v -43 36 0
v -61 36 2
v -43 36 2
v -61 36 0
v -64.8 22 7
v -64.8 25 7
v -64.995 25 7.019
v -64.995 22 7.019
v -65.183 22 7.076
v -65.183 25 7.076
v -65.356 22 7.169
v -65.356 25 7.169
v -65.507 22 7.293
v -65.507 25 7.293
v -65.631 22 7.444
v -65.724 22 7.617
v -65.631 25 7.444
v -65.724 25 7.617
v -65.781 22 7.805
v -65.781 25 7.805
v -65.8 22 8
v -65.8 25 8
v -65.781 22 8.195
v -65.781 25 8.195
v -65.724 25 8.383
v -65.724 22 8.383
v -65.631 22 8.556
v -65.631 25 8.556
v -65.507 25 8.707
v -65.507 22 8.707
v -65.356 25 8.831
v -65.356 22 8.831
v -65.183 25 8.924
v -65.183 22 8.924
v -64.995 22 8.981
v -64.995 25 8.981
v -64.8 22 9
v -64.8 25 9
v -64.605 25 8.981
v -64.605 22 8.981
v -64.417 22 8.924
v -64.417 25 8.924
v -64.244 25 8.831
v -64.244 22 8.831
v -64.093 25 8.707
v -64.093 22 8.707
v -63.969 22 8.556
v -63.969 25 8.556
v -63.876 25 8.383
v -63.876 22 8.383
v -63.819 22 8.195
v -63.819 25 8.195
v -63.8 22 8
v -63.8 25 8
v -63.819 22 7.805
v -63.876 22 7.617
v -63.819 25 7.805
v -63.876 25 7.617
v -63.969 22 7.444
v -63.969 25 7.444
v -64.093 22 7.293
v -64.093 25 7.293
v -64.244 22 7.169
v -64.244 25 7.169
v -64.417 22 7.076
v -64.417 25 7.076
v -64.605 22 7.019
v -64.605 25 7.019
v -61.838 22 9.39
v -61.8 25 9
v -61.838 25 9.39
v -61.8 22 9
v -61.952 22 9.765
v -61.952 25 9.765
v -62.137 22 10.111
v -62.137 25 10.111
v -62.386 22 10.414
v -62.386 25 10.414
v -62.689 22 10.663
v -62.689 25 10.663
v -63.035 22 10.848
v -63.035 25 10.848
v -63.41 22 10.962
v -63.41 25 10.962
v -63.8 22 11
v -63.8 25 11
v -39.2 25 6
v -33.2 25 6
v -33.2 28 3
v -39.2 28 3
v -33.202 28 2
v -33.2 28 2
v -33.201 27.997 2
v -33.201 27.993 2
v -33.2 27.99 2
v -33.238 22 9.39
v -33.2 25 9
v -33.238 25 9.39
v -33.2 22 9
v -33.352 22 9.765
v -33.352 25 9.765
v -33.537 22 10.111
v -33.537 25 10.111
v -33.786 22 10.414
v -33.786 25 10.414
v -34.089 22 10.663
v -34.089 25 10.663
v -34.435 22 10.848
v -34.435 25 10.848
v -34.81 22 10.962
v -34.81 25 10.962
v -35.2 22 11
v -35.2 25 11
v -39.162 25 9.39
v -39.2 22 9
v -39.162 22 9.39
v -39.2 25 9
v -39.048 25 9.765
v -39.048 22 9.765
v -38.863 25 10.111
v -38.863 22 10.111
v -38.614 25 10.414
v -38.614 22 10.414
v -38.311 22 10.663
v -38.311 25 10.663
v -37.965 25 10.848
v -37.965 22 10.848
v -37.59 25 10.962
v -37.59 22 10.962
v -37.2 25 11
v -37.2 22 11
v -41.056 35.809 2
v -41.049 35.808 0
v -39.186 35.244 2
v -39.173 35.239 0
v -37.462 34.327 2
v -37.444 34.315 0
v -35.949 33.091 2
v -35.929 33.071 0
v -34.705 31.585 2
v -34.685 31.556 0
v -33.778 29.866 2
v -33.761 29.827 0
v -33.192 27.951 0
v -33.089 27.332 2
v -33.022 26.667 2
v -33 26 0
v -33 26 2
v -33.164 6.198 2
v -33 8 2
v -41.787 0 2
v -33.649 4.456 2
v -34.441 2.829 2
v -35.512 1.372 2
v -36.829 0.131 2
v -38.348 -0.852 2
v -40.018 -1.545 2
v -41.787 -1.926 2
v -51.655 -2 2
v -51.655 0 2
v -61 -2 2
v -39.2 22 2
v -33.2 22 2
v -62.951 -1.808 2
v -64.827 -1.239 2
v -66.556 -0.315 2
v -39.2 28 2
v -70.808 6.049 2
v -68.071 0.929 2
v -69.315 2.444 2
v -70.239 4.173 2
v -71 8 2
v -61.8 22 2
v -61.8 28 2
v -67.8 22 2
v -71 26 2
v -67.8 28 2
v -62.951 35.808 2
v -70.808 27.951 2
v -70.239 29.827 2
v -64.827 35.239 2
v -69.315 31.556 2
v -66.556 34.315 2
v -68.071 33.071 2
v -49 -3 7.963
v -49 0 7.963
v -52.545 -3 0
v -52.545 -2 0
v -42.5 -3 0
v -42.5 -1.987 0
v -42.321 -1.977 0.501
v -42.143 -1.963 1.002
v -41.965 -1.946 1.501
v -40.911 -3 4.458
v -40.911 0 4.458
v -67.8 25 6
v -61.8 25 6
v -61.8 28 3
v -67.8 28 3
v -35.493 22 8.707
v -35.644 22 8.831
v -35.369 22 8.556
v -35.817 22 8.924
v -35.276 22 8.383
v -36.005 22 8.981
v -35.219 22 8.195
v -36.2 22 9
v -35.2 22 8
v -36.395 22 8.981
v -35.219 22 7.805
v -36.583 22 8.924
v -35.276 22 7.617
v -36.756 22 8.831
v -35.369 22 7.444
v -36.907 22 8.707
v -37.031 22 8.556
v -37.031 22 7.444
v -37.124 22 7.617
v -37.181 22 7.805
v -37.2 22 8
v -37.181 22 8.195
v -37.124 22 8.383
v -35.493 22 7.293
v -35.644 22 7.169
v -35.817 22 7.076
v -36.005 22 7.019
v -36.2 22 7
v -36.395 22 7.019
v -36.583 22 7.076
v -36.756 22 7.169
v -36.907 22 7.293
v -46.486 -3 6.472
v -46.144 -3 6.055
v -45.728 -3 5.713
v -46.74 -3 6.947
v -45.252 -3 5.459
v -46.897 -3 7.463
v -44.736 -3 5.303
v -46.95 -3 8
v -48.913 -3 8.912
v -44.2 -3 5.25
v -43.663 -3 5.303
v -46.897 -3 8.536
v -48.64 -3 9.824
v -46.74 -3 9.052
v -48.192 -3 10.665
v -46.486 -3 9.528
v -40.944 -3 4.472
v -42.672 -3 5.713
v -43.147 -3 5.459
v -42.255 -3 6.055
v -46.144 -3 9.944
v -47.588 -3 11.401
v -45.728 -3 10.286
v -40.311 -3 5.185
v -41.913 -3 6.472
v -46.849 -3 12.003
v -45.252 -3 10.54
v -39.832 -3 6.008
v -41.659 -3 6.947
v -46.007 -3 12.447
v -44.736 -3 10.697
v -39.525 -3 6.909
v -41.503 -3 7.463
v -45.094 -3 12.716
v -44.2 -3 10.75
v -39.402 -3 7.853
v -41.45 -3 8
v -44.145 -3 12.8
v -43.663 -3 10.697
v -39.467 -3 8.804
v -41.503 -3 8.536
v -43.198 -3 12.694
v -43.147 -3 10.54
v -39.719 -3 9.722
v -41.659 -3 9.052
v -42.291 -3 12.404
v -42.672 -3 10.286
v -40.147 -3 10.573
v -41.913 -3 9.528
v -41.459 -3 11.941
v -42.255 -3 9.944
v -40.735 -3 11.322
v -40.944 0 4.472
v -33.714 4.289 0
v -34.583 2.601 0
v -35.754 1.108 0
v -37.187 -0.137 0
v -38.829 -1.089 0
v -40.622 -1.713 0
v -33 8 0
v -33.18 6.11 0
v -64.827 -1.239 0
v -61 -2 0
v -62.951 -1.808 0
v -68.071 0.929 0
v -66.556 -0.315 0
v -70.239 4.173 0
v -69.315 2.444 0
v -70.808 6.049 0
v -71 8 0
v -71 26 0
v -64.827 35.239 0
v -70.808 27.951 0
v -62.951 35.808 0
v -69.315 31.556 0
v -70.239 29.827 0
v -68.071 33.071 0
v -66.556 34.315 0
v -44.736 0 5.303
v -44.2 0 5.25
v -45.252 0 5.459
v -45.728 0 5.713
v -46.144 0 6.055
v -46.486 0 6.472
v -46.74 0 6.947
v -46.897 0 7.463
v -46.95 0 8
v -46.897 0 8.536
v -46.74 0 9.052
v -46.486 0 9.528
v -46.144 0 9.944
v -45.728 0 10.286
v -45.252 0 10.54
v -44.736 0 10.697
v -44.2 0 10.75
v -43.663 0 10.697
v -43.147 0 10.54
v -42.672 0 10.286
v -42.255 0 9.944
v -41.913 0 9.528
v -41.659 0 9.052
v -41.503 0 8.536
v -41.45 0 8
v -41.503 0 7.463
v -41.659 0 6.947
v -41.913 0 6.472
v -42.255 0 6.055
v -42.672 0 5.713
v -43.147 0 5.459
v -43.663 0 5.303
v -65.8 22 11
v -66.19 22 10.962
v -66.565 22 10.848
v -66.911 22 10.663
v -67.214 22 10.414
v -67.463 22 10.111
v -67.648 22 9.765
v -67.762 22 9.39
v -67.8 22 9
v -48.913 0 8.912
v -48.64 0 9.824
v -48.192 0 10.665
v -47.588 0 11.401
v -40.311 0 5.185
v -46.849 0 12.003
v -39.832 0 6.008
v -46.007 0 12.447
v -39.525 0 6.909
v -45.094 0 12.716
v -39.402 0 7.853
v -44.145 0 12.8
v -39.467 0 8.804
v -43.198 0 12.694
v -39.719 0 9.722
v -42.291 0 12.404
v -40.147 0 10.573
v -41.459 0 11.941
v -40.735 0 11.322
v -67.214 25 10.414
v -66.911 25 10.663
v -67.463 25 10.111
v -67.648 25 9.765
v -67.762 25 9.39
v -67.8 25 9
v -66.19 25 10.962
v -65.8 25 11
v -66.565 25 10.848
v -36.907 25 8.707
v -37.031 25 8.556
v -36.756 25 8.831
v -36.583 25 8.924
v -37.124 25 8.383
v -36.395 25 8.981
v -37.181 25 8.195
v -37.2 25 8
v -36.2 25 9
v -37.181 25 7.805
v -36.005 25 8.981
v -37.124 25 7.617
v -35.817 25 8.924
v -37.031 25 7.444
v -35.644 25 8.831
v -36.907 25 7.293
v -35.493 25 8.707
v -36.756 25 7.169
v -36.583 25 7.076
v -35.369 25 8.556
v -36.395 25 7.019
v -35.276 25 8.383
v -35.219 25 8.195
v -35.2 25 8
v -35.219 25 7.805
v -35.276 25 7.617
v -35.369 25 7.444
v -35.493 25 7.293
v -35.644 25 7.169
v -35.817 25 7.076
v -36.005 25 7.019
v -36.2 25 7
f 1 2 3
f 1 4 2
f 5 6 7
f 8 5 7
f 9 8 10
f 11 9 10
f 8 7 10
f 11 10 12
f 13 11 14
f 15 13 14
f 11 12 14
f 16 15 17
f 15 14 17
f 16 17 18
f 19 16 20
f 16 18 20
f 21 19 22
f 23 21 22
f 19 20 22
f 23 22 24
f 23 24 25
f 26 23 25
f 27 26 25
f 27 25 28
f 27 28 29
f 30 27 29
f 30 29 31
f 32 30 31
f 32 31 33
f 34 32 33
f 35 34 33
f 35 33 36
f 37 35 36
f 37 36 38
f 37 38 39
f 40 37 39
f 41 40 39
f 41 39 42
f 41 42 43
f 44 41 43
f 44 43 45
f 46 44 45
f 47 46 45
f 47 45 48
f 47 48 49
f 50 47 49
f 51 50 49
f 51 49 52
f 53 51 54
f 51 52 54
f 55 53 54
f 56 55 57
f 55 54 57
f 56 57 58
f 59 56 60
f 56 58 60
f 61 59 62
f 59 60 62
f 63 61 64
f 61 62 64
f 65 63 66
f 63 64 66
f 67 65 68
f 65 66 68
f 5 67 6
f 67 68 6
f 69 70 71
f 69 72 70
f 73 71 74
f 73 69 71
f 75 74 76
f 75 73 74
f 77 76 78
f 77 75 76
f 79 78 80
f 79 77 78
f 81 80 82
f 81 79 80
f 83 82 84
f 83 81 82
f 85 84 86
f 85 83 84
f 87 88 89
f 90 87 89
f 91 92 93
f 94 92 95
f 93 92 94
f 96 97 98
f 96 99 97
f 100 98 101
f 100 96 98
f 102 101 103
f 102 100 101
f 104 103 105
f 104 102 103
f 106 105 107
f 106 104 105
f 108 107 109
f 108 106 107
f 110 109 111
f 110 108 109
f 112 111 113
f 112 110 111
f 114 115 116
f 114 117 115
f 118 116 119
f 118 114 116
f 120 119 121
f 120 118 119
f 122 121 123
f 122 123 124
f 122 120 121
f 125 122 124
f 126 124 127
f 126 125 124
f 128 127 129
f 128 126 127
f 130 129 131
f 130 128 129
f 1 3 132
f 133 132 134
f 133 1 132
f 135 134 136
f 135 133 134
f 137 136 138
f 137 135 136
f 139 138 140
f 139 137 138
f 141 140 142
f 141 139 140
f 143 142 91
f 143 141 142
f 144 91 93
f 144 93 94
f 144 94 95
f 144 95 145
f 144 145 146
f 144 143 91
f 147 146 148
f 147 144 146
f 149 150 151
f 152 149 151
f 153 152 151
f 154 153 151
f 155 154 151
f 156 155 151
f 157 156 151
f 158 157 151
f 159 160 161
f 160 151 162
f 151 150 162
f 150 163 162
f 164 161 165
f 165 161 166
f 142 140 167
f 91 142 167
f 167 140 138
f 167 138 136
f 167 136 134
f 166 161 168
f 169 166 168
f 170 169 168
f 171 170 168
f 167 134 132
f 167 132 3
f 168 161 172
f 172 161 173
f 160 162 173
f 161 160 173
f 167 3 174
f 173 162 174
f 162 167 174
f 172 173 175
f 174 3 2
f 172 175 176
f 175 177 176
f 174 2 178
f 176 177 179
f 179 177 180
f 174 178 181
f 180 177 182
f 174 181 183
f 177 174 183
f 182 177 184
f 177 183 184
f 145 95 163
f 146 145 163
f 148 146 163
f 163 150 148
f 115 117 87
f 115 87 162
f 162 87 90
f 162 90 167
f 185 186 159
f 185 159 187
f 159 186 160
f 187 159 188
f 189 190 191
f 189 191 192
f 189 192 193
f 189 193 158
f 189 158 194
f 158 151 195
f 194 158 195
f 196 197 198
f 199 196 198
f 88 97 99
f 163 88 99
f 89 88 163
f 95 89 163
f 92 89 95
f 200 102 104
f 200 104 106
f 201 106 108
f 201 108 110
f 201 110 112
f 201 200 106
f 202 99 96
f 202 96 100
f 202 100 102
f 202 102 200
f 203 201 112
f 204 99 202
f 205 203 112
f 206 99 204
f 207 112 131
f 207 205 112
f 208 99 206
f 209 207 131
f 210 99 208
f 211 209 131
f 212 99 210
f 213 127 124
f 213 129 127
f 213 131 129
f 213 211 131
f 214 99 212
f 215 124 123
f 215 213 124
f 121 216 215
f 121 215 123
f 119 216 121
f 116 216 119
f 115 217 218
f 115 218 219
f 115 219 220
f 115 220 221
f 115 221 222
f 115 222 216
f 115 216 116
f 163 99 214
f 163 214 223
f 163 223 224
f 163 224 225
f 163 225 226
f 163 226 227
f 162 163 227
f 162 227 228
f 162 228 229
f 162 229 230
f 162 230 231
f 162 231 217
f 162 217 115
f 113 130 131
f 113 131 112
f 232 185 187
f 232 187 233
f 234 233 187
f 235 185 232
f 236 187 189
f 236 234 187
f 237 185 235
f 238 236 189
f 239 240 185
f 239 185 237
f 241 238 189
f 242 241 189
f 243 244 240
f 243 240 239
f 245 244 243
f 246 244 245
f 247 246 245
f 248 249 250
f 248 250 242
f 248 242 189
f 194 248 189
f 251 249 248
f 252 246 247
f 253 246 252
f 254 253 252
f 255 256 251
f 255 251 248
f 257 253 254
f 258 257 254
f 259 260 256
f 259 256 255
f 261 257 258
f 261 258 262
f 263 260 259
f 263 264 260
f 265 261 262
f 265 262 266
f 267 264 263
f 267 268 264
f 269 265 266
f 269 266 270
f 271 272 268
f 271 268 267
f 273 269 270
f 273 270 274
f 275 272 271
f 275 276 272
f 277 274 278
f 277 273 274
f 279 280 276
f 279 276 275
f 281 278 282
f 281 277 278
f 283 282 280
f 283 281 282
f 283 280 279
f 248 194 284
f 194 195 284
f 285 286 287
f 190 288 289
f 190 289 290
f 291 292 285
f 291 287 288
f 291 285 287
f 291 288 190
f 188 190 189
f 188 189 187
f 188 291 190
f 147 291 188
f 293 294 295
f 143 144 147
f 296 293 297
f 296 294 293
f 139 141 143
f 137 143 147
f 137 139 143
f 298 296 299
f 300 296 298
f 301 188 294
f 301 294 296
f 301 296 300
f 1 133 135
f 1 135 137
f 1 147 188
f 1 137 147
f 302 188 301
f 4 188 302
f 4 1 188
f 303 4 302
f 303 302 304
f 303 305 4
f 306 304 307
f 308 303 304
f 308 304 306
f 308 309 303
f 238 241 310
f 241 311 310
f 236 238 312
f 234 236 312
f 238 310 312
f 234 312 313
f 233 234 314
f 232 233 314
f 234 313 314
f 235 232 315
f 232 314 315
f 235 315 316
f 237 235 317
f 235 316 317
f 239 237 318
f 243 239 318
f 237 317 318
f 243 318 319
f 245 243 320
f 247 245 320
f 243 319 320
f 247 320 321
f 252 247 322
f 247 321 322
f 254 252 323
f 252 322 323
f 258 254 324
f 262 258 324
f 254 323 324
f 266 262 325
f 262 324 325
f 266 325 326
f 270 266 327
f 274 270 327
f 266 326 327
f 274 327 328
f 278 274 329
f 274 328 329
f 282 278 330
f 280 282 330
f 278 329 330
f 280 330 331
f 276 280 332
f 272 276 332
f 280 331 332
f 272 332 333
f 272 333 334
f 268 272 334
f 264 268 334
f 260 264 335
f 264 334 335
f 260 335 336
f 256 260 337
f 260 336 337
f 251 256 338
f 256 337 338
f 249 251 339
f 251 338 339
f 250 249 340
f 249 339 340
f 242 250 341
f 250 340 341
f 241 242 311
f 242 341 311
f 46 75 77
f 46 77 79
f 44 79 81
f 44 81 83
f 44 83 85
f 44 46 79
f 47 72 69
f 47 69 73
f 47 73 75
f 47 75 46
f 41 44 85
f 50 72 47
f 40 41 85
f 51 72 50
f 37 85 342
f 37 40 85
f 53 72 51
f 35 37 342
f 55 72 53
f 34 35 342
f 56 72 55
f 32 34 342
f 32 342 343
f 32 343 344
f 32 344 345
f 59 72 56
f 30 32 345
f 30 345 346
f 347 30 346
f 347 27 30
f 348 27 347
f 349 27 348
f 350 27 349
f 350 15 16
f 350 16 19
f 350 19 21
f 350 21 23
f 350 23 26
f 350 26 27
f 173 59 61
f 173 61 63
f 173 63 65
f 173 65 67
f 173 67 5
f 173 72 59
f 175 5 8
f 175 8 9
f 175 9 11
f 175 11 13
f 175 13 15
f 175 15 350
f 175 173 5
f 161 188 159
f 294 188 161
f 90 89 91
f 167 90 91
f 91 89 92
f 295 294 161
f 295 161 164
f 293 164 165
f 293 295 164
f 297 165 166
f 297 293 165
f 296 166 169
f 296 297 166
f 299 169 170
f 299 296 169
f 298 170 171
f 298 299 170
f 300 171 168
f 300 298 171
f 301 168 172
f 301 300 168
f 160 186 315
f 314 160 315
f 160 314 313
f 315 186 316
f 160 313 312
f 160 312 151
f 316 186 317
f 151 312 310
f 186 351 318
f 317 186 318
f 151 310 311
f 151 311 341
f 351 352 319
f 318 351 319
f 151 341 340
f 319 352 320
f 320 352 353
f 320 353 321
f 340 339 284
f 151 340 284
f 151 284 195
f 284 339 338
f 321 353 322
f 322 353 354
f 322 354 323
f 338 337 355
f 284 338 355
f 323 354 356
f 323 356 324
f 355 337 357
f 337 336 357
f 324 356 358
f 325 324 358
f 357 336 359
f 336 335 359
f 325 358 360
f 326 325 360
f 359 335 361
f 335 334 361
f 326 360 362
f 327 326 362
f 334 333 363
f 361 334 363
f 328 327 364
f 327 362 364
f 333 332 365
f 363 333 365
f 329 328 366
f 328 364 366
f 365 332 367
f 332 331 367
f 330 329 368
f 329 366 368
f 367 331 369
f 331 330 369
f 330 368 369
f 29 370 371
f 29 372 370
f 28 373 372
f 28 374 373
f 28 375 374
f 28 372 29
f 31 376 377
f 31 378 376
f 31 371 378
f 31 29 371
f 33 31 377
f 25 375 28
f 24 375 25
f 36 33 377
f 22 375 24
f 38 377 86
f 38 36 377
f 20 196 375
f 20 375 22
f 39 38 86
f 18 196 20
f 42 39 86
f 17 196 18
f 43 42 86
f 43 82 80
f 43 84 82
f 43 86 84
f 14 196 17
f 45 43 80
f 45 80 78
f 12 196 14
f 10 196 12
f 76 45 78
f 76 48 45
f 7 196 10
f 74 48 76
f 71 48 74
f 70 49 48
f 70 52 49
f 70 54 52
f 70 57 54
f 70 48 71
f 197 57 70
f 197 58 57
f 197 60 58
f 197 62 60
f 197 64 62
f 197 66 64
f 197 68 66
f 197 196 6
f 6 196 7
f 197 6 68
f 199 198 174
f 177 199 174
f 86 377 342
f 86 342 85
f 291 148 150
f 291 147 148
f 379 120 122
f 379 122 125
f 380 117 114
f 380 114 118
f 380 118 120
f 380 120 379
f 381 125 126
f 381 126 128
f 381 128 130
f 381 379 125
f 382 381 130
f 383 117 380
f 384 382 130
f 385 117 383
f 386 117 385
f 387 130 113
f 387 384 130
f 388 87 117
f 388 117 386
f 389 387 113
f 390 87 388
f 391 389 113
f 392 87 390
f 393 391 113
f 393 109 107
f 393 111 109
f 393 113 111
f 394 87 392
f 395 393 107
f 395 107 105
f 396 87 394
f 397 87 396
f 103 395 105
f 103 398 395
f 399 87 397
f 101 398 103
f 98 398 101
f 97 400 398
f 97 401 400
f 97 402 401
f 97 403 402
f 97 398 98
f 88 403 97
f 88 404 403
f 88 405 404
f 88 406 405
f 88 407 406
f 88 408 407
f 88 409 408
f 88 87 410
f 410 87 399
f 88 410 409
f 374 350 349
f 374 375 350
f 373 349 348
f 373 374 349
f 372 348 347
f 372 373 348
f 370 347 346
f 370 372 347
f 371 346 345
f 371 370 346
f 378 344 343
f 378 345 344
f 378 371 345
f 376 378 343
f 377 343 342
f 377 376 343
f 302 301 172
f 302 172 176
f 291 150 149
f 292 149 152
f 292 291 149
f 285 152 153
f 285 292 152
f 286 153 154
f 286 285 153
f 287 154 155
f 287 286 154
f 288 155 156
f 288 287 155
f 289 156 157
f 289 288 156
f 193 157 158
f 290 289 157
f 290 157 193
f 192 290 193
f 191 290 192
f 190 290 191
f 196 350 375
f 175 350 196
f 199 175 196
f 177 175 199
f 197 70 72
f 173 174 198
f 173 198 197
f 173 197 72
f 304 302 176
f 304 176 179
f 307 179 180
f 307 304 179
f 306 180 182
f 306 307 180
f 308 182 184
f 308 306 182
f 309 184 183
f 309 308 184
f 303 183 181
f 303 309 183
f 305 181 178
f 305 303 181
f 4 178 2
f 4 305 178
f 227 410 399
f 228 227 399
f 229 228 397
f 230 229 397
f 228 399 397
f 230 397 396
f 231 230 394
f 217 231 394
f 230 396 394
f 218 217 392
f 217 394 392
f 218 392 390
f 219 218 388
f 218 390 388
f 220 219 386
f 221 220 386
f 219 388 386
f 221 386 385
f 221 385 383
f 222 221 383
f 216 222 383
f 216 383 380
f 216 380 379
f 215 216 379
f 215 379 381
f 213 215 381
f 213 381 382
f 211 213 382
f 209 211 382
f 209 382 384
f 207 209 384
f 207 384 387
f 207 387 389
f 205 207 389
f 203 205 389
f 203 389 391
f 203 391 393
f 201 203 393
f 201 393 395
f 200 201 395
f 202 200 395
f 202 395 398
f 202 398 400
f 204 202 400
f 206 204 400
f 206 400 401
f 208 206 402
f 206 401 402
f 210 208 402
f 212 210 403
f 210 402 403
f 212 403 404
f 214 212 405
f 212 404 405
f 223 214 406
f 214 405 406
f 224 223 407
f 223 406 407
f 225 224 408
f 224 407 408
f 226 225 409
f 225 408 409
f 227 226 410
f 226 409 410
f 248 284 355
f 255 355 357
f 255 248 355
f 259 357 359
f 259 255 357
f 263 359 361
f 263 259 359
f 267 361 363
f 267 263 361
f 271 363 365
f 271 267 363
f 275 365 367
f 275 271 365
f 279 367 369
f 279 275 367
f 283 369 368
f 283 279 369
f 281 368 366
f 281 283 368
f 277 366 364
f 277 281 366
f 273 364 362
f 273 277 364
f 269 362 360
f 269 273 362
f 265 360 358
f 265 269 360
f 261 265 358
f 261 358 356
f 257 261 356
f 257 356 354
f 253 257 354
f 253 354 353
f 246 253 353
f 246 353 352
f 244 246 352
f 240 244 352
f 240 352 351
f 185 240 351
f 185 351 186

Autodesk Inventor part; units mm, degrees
ref_plane "YZ Plane" through (0, 0, 0) normal (1, 0, 0) x (0, 1, 0)
ref_plane "XZ Plane" through (0, 0, 0) normal (0, 1, 0) x (-1, 0, 0)
ref_plane "XY Plane" through (0, 0, 0) normal (0, 0, 1) x (1, 0, 0)
sketch "Boceto3" plane through (-69.7362, 30.866, 0) normal (0, 0, -1) x (-1, 0, 0)
  line L0 (-8.7362, 5.134) -> (-26.7362, 5.134)
  line L1 (-36.7362, -4.866) -> (-36.7362, -22.866)
  line L2 (-26.7362, -32.866) -> (-8.7362, -32.866)
  line L3 (1.2638, -22.866) -> (1.2638, -4.866)
  line L4 (1.2638, -23.3279) -> (1.2638, -4.4042) construction
  line L5 (-8.2744, 5.134) -> (-27.1981, 5.134) construction
  line L6 (-36.7362, -4.4042) -> (-36.7362, -23.3295) projected
  circle A0 centre (-8.7362, -22.866) radius 10.0001 construction
  arc A1 (-8.7362, -32.866) -> (1.2638, -22.866) centre (-8.7362, -22.866) ccw
  arc A2 (1.2638, -4.866) -> (-8.7362, 5.134) centre (-8.7362, -4.866) ccw
  arc A3 (-26.7362, 5.134) -> (-36.7362, -4.866) centre (-26.7362, -4.866) ccw
  arc A4 (-36.7362, -22.866) -> (-26.7362, -32.866) centre (-26.7362, -22.866) ccw
  point P0 (-69.7362, -30.866)
  point P1 (1.2638, 5.134)
  point P2 (-36.7362, 5.134)
  dimension "d3" = 10
  dimension "d4" = 10
extrude "Extrusión2" add sketch "Boceto3" against normal blind 2
sketch "Boceto5" plane through (-61, -2, 0) normal (0, -1, 0) x (1, 0, 0)
  line L0 (18, 0) -> (28, 0) construction
  line L1 (18.5, 0) -> (20.0893, 4.4576)
  line L2 (20.0893, 4.4576) -> (12.0357, 8.0433)
  line L3 (12.0357, 8.0433) -> (8.4546, 0)
  line L4 (18, 0) -> (0, 0) construction
  line L5 (8.4546, 0) -> (18.5, 0)
  point P0 (61, 0)
  dimension "d7" = 9.5
  dimension "d8" = 66
  dimension "d9" = 8.8157
  dimension "d16" = 70.378
  dimension "d17" = 10.0454
extrude "Extrusión3" add sketch "Boceto5" along normal blind 1 and the other way blind 2
sketch "Boceto6" plane through (-61, -3, 0) normal (0, -1, 0) x (1, 0, 0)
  circle A0 centre (16.8, 8) radius 2.8 construction
  circle A1 centre (16.8003, 7.9997) radius 4.8004 projected
  point P0 (61, 0)
extrude "Extrusión4" add sketch "Boceto6" against normal blind 3
sketch "Boceto7" plane through (-61, -3, 0) normal (0, -1, 0) x (1, 0, 0)
  arc A0 (20.0563, 4.4723) -> (12, 7.9631) centre (16.8003, 7.9997) ccw projected
  point P0 (61, 0)
hole "Agujero1" at (-44.1997, -3, 7.9997) direction (0, 1, 0) diameter 5.5 end through all
sketch "Boceto8" plane through (-69.7362, 30.866, 2) normal (0, 0, 1) x (1, 0, 0)
  line L0 (36.5362, -8.866) -> (30.5362, -8.866)
  line L1 (30.5362, -8.866) -> (30.5362, -5.866)
  line L2 (30.5362, -5.866) -> (36.5362, -5.866)
  line L3 (36.5362, -5.866) -> (36.5362, -8.866)
  line L4 (36.7362, -22.866) -> (36.7362, -4.866) construction
  point P0 (69.7362, -30.866)
  dimension "d27" = 0.2
  dimension "d28" = 3
  dimension "d29" = 6
  dimension "d30" = 1
extrude "Extrusión5" add sketch "Boceto8" along normal blind 9
fillet "Empalme1" radius 2 2 edges at (-33.2, 23.5, 11) (-39.2, 23.5, 11)
sketch "Boceto9" plane through (-39.2, 22, 2) normal (0, -1, 0) x (1, 0, 0)
  line L0 (2, 9) -> (4, 9) construction
  line L1 (3, 9) -> (3, 0) construction
  line L2 (6, 0) -> (0, 0) construction
  point P0 (39.2, -2)
  point P1 (3, 6)
  dimension "d34" = 3
hole "Agujero2" at (-36.2, 22, 8) direction (0, 1, 0) diameter 2 end through all
sketch "Boceto10" plane through (-33.2, 22, 2) normal (1, 0, 0) x (0, 0, -1)
  line L0 (0, 3) -> (-7, 3) construction
  line L1 (-4, 3) -> (-1, 6)
  line L2 (-1, 6) -> (0, 6)
  line L3 (0, 6) -> (0, 3)
  line L4 (-4, 3) -> (0, 3)
  point P0 (2, -22)
  dimension "d42" = 45
  dimension "d43" = 1
  dimension "d44" = 3
extrude "Extrusión6" add sketch "Boceto10" against normal blind 6
pattern_linear "Patrón rectangular1" count 2 spacing 28.6 along (-1, 0, 0) of "Extrusión6", "Extrusión5", "Agujero2", "Empalme1"
properties part number "base"
